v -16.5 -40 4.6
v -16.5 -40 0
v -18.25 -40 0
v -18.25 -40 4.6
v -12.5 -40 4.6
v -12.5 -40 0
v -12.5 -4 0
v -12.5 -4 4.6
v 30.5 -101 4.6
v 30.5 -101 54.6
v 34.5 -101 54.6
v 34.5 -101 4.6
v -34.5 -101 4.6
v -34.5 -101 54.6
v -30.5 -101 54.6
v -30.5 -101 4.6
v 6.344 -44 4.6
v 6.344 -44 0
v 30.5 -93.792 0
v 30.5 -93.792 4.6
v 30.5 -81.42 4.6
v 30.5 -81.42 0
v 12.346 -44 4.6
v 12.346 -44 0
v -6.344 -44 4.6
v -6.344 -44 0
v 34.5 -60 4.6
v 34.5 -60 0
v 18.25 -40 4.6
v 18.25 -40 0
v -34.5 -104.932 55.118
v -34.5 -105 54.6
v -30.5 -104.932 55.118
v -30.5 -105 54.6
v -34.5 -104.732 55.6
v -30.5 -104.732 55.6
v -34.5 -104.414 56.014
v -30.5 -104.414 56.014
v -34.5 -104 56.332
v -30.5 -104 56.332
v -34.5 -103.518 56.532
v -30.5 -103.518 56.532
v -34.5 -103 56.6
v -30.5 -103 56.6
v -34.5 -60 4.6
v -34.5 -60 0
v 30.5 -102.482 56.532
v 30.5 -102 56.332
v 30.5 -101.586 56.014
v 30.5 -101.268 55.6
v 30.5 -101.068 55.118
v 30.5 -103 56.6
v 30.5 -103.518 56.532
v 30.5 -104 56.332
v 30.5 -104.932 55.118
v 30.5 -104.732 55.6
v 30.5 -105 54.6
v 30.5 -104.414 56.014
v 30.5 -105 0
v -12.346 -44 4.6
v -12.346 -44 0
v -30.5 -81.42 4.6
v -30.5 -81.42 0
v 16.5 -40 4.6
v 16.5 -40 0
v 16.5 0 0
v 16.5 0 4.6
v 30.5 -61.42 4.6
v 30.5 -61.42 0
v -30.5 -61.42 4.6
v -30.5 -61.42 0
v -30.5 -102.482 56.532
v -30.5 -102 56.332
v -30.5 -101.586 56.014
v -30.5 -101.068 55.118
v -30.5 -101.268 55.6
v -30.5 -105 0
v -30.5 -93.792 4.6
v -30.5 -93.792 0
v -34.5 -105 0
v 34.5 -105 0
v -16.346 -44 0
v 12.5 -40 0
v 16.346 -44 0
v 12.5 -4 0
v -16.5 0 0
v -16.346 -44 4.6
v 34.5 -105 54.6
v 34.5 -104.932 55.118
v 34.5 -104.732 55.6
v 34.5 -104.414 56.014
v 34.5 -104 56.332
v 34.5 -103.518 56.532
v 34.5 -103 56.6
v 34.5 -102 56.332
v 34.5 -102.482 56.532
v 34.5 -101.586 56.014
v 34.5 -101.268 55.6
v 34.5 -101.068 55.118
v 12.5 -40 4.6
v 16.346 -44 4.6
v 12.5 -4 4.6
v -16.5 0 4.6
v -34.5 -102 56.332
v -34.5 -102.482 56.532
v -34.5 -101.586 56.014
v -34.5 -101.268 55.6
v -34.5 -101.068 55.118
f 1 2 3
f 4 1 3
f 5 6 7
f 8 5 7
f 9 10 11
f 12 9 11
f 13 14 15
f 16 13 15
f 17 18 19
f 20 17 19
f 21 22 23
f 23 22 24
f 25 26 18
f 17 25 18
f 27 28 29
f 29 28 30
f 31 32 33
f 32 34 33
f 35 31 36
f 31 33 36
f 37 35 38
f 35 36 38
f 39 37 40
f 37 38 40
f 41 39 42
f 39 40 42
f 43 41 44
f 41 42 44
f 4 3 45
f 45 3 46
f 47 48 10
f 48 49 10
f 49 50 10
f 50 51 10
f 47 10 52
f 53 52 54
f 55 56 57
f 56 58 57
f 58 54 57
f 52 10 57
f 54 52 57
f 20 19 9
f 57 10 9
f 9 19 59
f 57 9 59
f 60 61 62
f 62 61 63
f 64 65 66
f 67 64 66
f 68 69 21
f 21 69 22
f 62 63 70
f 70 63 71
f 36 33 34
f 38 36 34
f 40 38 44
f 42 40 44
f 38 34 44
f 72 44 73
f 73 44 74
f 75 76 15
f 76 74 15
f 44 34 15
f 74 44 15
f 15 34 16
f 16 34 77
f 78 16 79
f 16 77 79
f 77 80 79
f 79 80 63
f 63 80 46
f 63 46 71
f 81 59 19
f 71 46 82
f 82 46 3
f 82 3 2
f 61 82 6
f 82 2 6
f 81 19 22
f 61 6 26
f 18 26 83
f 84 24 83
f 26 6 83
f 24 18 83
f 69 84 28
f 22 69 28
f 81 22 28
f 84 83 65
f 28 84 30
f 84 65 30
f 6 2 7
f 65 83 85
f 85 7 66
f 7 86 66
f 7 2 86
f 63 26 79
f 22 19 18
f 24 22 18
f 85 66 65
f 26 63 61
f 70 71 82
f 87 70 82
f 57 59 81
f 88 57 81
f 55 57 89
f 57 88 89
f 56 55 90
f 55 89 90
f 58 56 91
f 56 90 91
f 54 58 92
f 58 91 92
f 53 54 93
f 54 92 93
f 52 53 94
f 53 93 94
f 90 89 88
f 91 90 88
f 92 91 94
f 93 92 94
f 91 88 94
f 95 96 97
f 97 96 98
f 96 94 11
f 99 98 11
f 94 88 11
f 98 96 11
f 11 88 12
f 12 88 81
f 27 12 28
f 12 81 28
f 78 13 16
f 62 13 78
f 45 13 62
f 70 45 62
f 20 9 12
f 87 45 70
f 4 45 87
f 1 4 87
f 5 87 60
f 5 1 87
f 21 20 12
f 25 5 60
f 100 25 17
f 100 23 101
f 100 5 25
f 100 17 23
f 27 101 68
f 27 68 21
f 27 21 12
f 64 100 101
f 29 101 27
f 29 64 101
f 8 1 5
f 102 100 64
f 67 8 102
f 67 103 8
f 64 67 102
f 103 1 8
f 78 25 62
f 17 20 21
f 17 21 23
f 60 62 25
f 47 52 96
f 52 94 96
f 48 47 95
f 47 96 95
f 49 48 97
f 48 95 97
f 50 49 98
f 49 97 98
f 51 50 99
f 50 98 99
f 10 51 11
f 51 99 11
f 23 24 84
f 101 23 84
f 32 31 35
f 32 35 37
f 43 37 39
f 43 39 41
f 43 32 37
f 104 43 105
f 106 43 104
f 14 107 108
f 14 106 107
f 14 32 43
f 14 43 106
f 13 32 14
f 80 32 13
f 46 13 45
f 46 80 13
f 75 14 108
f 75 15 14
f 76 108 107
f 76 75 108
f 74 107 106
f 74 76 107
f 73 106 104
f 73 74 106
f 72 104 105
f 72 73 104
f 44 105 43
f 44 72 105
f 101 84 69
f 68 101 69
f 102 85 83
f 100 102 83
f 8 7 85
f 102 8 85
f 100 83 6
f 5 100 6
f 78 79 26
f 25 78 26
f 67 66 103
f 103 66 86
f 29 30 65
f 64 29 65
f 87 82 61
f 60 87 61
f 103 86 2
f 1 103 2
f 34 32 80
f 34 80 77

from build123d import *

# Parameters (mm, degrees)
F1_DEPTH = 4.6
F2_W     = 4
F2_H     = 4
F3_DEPTH = 52
F4_R     = 1.99999


# Not quite as in the source:
# - a fillet or chamfer is up to 0.001 mm smaller than in the source, because OpenCascade refuses the exact size


with BuildPart() as f1:
    # F0 (on Top) → F1 (new body)
    with BuildSketch(Plane.XY):
        Polygon((16.5, 0), (-16.5, 0), (-16.5, -40), (-12.5, -40), (-12.5, -4), (12.5, -4), (12.5, -40), (16.5, -40), align=None)
        Polygon((-12.5, -40), (-16.5, -40), (-18.25, -40), (-34.5, -60), (-34.5, -105), (-30.5, -105), (-30.5, -93.7917722906), (-30.5, -81.420162501), (-30.5, -61.420162501), (-16.346117968, -44), (-12.346117968, -44), (-6.344200027, -44), (6.344200027, -44), (12.346117968, -44), (16.346117968, -44), (30.5, -61.420162501), (30.5, -81.420162501), (30.5, -93.7917722906), (30.5, -105), (34.5, -105), (34.5, -60), (18.25, -40), (16.5, -40), (12.5, -40), align=None)
        Polygon((-30.5, -81.420162501), (-30.5, -93.7917722906), (-6.344200027, -44), (-12.346117968, -44), align=None)
        Polygon((6.344200027, -44), (30.5, -93.7917722906), (30.5, -81.420162501), (12.346117968, -44), align=None)
    extrude(amount=F1_DEPTH)

    # F2 (on face) → F3 (join)
    with BuildSketch(Plane.XY.offset(4.6)):
        with Locations((-32.5, -103)):
            Rectangle(F2_W, F2_H)
        with Locations((32.5, -103)):
            Rectangle(F2_W, F2_H)
    extrude(amount=F3_DEPTH)

    # F4 (radius 2 in the source; OpenCascade refuses exactly that, so slightly less here)
    f4_edges = [f1.edges().sort_by_distance(p)[0] for p in [
        (-32.5, -105, 56.6),
        (-32.5, -101, 56.6),
        (32.5, -105, 56.6),
        (32.5, -101, 56.6),
    ]]
    fillet(f4_edges, radius=F4_R)


solid = f1.part
